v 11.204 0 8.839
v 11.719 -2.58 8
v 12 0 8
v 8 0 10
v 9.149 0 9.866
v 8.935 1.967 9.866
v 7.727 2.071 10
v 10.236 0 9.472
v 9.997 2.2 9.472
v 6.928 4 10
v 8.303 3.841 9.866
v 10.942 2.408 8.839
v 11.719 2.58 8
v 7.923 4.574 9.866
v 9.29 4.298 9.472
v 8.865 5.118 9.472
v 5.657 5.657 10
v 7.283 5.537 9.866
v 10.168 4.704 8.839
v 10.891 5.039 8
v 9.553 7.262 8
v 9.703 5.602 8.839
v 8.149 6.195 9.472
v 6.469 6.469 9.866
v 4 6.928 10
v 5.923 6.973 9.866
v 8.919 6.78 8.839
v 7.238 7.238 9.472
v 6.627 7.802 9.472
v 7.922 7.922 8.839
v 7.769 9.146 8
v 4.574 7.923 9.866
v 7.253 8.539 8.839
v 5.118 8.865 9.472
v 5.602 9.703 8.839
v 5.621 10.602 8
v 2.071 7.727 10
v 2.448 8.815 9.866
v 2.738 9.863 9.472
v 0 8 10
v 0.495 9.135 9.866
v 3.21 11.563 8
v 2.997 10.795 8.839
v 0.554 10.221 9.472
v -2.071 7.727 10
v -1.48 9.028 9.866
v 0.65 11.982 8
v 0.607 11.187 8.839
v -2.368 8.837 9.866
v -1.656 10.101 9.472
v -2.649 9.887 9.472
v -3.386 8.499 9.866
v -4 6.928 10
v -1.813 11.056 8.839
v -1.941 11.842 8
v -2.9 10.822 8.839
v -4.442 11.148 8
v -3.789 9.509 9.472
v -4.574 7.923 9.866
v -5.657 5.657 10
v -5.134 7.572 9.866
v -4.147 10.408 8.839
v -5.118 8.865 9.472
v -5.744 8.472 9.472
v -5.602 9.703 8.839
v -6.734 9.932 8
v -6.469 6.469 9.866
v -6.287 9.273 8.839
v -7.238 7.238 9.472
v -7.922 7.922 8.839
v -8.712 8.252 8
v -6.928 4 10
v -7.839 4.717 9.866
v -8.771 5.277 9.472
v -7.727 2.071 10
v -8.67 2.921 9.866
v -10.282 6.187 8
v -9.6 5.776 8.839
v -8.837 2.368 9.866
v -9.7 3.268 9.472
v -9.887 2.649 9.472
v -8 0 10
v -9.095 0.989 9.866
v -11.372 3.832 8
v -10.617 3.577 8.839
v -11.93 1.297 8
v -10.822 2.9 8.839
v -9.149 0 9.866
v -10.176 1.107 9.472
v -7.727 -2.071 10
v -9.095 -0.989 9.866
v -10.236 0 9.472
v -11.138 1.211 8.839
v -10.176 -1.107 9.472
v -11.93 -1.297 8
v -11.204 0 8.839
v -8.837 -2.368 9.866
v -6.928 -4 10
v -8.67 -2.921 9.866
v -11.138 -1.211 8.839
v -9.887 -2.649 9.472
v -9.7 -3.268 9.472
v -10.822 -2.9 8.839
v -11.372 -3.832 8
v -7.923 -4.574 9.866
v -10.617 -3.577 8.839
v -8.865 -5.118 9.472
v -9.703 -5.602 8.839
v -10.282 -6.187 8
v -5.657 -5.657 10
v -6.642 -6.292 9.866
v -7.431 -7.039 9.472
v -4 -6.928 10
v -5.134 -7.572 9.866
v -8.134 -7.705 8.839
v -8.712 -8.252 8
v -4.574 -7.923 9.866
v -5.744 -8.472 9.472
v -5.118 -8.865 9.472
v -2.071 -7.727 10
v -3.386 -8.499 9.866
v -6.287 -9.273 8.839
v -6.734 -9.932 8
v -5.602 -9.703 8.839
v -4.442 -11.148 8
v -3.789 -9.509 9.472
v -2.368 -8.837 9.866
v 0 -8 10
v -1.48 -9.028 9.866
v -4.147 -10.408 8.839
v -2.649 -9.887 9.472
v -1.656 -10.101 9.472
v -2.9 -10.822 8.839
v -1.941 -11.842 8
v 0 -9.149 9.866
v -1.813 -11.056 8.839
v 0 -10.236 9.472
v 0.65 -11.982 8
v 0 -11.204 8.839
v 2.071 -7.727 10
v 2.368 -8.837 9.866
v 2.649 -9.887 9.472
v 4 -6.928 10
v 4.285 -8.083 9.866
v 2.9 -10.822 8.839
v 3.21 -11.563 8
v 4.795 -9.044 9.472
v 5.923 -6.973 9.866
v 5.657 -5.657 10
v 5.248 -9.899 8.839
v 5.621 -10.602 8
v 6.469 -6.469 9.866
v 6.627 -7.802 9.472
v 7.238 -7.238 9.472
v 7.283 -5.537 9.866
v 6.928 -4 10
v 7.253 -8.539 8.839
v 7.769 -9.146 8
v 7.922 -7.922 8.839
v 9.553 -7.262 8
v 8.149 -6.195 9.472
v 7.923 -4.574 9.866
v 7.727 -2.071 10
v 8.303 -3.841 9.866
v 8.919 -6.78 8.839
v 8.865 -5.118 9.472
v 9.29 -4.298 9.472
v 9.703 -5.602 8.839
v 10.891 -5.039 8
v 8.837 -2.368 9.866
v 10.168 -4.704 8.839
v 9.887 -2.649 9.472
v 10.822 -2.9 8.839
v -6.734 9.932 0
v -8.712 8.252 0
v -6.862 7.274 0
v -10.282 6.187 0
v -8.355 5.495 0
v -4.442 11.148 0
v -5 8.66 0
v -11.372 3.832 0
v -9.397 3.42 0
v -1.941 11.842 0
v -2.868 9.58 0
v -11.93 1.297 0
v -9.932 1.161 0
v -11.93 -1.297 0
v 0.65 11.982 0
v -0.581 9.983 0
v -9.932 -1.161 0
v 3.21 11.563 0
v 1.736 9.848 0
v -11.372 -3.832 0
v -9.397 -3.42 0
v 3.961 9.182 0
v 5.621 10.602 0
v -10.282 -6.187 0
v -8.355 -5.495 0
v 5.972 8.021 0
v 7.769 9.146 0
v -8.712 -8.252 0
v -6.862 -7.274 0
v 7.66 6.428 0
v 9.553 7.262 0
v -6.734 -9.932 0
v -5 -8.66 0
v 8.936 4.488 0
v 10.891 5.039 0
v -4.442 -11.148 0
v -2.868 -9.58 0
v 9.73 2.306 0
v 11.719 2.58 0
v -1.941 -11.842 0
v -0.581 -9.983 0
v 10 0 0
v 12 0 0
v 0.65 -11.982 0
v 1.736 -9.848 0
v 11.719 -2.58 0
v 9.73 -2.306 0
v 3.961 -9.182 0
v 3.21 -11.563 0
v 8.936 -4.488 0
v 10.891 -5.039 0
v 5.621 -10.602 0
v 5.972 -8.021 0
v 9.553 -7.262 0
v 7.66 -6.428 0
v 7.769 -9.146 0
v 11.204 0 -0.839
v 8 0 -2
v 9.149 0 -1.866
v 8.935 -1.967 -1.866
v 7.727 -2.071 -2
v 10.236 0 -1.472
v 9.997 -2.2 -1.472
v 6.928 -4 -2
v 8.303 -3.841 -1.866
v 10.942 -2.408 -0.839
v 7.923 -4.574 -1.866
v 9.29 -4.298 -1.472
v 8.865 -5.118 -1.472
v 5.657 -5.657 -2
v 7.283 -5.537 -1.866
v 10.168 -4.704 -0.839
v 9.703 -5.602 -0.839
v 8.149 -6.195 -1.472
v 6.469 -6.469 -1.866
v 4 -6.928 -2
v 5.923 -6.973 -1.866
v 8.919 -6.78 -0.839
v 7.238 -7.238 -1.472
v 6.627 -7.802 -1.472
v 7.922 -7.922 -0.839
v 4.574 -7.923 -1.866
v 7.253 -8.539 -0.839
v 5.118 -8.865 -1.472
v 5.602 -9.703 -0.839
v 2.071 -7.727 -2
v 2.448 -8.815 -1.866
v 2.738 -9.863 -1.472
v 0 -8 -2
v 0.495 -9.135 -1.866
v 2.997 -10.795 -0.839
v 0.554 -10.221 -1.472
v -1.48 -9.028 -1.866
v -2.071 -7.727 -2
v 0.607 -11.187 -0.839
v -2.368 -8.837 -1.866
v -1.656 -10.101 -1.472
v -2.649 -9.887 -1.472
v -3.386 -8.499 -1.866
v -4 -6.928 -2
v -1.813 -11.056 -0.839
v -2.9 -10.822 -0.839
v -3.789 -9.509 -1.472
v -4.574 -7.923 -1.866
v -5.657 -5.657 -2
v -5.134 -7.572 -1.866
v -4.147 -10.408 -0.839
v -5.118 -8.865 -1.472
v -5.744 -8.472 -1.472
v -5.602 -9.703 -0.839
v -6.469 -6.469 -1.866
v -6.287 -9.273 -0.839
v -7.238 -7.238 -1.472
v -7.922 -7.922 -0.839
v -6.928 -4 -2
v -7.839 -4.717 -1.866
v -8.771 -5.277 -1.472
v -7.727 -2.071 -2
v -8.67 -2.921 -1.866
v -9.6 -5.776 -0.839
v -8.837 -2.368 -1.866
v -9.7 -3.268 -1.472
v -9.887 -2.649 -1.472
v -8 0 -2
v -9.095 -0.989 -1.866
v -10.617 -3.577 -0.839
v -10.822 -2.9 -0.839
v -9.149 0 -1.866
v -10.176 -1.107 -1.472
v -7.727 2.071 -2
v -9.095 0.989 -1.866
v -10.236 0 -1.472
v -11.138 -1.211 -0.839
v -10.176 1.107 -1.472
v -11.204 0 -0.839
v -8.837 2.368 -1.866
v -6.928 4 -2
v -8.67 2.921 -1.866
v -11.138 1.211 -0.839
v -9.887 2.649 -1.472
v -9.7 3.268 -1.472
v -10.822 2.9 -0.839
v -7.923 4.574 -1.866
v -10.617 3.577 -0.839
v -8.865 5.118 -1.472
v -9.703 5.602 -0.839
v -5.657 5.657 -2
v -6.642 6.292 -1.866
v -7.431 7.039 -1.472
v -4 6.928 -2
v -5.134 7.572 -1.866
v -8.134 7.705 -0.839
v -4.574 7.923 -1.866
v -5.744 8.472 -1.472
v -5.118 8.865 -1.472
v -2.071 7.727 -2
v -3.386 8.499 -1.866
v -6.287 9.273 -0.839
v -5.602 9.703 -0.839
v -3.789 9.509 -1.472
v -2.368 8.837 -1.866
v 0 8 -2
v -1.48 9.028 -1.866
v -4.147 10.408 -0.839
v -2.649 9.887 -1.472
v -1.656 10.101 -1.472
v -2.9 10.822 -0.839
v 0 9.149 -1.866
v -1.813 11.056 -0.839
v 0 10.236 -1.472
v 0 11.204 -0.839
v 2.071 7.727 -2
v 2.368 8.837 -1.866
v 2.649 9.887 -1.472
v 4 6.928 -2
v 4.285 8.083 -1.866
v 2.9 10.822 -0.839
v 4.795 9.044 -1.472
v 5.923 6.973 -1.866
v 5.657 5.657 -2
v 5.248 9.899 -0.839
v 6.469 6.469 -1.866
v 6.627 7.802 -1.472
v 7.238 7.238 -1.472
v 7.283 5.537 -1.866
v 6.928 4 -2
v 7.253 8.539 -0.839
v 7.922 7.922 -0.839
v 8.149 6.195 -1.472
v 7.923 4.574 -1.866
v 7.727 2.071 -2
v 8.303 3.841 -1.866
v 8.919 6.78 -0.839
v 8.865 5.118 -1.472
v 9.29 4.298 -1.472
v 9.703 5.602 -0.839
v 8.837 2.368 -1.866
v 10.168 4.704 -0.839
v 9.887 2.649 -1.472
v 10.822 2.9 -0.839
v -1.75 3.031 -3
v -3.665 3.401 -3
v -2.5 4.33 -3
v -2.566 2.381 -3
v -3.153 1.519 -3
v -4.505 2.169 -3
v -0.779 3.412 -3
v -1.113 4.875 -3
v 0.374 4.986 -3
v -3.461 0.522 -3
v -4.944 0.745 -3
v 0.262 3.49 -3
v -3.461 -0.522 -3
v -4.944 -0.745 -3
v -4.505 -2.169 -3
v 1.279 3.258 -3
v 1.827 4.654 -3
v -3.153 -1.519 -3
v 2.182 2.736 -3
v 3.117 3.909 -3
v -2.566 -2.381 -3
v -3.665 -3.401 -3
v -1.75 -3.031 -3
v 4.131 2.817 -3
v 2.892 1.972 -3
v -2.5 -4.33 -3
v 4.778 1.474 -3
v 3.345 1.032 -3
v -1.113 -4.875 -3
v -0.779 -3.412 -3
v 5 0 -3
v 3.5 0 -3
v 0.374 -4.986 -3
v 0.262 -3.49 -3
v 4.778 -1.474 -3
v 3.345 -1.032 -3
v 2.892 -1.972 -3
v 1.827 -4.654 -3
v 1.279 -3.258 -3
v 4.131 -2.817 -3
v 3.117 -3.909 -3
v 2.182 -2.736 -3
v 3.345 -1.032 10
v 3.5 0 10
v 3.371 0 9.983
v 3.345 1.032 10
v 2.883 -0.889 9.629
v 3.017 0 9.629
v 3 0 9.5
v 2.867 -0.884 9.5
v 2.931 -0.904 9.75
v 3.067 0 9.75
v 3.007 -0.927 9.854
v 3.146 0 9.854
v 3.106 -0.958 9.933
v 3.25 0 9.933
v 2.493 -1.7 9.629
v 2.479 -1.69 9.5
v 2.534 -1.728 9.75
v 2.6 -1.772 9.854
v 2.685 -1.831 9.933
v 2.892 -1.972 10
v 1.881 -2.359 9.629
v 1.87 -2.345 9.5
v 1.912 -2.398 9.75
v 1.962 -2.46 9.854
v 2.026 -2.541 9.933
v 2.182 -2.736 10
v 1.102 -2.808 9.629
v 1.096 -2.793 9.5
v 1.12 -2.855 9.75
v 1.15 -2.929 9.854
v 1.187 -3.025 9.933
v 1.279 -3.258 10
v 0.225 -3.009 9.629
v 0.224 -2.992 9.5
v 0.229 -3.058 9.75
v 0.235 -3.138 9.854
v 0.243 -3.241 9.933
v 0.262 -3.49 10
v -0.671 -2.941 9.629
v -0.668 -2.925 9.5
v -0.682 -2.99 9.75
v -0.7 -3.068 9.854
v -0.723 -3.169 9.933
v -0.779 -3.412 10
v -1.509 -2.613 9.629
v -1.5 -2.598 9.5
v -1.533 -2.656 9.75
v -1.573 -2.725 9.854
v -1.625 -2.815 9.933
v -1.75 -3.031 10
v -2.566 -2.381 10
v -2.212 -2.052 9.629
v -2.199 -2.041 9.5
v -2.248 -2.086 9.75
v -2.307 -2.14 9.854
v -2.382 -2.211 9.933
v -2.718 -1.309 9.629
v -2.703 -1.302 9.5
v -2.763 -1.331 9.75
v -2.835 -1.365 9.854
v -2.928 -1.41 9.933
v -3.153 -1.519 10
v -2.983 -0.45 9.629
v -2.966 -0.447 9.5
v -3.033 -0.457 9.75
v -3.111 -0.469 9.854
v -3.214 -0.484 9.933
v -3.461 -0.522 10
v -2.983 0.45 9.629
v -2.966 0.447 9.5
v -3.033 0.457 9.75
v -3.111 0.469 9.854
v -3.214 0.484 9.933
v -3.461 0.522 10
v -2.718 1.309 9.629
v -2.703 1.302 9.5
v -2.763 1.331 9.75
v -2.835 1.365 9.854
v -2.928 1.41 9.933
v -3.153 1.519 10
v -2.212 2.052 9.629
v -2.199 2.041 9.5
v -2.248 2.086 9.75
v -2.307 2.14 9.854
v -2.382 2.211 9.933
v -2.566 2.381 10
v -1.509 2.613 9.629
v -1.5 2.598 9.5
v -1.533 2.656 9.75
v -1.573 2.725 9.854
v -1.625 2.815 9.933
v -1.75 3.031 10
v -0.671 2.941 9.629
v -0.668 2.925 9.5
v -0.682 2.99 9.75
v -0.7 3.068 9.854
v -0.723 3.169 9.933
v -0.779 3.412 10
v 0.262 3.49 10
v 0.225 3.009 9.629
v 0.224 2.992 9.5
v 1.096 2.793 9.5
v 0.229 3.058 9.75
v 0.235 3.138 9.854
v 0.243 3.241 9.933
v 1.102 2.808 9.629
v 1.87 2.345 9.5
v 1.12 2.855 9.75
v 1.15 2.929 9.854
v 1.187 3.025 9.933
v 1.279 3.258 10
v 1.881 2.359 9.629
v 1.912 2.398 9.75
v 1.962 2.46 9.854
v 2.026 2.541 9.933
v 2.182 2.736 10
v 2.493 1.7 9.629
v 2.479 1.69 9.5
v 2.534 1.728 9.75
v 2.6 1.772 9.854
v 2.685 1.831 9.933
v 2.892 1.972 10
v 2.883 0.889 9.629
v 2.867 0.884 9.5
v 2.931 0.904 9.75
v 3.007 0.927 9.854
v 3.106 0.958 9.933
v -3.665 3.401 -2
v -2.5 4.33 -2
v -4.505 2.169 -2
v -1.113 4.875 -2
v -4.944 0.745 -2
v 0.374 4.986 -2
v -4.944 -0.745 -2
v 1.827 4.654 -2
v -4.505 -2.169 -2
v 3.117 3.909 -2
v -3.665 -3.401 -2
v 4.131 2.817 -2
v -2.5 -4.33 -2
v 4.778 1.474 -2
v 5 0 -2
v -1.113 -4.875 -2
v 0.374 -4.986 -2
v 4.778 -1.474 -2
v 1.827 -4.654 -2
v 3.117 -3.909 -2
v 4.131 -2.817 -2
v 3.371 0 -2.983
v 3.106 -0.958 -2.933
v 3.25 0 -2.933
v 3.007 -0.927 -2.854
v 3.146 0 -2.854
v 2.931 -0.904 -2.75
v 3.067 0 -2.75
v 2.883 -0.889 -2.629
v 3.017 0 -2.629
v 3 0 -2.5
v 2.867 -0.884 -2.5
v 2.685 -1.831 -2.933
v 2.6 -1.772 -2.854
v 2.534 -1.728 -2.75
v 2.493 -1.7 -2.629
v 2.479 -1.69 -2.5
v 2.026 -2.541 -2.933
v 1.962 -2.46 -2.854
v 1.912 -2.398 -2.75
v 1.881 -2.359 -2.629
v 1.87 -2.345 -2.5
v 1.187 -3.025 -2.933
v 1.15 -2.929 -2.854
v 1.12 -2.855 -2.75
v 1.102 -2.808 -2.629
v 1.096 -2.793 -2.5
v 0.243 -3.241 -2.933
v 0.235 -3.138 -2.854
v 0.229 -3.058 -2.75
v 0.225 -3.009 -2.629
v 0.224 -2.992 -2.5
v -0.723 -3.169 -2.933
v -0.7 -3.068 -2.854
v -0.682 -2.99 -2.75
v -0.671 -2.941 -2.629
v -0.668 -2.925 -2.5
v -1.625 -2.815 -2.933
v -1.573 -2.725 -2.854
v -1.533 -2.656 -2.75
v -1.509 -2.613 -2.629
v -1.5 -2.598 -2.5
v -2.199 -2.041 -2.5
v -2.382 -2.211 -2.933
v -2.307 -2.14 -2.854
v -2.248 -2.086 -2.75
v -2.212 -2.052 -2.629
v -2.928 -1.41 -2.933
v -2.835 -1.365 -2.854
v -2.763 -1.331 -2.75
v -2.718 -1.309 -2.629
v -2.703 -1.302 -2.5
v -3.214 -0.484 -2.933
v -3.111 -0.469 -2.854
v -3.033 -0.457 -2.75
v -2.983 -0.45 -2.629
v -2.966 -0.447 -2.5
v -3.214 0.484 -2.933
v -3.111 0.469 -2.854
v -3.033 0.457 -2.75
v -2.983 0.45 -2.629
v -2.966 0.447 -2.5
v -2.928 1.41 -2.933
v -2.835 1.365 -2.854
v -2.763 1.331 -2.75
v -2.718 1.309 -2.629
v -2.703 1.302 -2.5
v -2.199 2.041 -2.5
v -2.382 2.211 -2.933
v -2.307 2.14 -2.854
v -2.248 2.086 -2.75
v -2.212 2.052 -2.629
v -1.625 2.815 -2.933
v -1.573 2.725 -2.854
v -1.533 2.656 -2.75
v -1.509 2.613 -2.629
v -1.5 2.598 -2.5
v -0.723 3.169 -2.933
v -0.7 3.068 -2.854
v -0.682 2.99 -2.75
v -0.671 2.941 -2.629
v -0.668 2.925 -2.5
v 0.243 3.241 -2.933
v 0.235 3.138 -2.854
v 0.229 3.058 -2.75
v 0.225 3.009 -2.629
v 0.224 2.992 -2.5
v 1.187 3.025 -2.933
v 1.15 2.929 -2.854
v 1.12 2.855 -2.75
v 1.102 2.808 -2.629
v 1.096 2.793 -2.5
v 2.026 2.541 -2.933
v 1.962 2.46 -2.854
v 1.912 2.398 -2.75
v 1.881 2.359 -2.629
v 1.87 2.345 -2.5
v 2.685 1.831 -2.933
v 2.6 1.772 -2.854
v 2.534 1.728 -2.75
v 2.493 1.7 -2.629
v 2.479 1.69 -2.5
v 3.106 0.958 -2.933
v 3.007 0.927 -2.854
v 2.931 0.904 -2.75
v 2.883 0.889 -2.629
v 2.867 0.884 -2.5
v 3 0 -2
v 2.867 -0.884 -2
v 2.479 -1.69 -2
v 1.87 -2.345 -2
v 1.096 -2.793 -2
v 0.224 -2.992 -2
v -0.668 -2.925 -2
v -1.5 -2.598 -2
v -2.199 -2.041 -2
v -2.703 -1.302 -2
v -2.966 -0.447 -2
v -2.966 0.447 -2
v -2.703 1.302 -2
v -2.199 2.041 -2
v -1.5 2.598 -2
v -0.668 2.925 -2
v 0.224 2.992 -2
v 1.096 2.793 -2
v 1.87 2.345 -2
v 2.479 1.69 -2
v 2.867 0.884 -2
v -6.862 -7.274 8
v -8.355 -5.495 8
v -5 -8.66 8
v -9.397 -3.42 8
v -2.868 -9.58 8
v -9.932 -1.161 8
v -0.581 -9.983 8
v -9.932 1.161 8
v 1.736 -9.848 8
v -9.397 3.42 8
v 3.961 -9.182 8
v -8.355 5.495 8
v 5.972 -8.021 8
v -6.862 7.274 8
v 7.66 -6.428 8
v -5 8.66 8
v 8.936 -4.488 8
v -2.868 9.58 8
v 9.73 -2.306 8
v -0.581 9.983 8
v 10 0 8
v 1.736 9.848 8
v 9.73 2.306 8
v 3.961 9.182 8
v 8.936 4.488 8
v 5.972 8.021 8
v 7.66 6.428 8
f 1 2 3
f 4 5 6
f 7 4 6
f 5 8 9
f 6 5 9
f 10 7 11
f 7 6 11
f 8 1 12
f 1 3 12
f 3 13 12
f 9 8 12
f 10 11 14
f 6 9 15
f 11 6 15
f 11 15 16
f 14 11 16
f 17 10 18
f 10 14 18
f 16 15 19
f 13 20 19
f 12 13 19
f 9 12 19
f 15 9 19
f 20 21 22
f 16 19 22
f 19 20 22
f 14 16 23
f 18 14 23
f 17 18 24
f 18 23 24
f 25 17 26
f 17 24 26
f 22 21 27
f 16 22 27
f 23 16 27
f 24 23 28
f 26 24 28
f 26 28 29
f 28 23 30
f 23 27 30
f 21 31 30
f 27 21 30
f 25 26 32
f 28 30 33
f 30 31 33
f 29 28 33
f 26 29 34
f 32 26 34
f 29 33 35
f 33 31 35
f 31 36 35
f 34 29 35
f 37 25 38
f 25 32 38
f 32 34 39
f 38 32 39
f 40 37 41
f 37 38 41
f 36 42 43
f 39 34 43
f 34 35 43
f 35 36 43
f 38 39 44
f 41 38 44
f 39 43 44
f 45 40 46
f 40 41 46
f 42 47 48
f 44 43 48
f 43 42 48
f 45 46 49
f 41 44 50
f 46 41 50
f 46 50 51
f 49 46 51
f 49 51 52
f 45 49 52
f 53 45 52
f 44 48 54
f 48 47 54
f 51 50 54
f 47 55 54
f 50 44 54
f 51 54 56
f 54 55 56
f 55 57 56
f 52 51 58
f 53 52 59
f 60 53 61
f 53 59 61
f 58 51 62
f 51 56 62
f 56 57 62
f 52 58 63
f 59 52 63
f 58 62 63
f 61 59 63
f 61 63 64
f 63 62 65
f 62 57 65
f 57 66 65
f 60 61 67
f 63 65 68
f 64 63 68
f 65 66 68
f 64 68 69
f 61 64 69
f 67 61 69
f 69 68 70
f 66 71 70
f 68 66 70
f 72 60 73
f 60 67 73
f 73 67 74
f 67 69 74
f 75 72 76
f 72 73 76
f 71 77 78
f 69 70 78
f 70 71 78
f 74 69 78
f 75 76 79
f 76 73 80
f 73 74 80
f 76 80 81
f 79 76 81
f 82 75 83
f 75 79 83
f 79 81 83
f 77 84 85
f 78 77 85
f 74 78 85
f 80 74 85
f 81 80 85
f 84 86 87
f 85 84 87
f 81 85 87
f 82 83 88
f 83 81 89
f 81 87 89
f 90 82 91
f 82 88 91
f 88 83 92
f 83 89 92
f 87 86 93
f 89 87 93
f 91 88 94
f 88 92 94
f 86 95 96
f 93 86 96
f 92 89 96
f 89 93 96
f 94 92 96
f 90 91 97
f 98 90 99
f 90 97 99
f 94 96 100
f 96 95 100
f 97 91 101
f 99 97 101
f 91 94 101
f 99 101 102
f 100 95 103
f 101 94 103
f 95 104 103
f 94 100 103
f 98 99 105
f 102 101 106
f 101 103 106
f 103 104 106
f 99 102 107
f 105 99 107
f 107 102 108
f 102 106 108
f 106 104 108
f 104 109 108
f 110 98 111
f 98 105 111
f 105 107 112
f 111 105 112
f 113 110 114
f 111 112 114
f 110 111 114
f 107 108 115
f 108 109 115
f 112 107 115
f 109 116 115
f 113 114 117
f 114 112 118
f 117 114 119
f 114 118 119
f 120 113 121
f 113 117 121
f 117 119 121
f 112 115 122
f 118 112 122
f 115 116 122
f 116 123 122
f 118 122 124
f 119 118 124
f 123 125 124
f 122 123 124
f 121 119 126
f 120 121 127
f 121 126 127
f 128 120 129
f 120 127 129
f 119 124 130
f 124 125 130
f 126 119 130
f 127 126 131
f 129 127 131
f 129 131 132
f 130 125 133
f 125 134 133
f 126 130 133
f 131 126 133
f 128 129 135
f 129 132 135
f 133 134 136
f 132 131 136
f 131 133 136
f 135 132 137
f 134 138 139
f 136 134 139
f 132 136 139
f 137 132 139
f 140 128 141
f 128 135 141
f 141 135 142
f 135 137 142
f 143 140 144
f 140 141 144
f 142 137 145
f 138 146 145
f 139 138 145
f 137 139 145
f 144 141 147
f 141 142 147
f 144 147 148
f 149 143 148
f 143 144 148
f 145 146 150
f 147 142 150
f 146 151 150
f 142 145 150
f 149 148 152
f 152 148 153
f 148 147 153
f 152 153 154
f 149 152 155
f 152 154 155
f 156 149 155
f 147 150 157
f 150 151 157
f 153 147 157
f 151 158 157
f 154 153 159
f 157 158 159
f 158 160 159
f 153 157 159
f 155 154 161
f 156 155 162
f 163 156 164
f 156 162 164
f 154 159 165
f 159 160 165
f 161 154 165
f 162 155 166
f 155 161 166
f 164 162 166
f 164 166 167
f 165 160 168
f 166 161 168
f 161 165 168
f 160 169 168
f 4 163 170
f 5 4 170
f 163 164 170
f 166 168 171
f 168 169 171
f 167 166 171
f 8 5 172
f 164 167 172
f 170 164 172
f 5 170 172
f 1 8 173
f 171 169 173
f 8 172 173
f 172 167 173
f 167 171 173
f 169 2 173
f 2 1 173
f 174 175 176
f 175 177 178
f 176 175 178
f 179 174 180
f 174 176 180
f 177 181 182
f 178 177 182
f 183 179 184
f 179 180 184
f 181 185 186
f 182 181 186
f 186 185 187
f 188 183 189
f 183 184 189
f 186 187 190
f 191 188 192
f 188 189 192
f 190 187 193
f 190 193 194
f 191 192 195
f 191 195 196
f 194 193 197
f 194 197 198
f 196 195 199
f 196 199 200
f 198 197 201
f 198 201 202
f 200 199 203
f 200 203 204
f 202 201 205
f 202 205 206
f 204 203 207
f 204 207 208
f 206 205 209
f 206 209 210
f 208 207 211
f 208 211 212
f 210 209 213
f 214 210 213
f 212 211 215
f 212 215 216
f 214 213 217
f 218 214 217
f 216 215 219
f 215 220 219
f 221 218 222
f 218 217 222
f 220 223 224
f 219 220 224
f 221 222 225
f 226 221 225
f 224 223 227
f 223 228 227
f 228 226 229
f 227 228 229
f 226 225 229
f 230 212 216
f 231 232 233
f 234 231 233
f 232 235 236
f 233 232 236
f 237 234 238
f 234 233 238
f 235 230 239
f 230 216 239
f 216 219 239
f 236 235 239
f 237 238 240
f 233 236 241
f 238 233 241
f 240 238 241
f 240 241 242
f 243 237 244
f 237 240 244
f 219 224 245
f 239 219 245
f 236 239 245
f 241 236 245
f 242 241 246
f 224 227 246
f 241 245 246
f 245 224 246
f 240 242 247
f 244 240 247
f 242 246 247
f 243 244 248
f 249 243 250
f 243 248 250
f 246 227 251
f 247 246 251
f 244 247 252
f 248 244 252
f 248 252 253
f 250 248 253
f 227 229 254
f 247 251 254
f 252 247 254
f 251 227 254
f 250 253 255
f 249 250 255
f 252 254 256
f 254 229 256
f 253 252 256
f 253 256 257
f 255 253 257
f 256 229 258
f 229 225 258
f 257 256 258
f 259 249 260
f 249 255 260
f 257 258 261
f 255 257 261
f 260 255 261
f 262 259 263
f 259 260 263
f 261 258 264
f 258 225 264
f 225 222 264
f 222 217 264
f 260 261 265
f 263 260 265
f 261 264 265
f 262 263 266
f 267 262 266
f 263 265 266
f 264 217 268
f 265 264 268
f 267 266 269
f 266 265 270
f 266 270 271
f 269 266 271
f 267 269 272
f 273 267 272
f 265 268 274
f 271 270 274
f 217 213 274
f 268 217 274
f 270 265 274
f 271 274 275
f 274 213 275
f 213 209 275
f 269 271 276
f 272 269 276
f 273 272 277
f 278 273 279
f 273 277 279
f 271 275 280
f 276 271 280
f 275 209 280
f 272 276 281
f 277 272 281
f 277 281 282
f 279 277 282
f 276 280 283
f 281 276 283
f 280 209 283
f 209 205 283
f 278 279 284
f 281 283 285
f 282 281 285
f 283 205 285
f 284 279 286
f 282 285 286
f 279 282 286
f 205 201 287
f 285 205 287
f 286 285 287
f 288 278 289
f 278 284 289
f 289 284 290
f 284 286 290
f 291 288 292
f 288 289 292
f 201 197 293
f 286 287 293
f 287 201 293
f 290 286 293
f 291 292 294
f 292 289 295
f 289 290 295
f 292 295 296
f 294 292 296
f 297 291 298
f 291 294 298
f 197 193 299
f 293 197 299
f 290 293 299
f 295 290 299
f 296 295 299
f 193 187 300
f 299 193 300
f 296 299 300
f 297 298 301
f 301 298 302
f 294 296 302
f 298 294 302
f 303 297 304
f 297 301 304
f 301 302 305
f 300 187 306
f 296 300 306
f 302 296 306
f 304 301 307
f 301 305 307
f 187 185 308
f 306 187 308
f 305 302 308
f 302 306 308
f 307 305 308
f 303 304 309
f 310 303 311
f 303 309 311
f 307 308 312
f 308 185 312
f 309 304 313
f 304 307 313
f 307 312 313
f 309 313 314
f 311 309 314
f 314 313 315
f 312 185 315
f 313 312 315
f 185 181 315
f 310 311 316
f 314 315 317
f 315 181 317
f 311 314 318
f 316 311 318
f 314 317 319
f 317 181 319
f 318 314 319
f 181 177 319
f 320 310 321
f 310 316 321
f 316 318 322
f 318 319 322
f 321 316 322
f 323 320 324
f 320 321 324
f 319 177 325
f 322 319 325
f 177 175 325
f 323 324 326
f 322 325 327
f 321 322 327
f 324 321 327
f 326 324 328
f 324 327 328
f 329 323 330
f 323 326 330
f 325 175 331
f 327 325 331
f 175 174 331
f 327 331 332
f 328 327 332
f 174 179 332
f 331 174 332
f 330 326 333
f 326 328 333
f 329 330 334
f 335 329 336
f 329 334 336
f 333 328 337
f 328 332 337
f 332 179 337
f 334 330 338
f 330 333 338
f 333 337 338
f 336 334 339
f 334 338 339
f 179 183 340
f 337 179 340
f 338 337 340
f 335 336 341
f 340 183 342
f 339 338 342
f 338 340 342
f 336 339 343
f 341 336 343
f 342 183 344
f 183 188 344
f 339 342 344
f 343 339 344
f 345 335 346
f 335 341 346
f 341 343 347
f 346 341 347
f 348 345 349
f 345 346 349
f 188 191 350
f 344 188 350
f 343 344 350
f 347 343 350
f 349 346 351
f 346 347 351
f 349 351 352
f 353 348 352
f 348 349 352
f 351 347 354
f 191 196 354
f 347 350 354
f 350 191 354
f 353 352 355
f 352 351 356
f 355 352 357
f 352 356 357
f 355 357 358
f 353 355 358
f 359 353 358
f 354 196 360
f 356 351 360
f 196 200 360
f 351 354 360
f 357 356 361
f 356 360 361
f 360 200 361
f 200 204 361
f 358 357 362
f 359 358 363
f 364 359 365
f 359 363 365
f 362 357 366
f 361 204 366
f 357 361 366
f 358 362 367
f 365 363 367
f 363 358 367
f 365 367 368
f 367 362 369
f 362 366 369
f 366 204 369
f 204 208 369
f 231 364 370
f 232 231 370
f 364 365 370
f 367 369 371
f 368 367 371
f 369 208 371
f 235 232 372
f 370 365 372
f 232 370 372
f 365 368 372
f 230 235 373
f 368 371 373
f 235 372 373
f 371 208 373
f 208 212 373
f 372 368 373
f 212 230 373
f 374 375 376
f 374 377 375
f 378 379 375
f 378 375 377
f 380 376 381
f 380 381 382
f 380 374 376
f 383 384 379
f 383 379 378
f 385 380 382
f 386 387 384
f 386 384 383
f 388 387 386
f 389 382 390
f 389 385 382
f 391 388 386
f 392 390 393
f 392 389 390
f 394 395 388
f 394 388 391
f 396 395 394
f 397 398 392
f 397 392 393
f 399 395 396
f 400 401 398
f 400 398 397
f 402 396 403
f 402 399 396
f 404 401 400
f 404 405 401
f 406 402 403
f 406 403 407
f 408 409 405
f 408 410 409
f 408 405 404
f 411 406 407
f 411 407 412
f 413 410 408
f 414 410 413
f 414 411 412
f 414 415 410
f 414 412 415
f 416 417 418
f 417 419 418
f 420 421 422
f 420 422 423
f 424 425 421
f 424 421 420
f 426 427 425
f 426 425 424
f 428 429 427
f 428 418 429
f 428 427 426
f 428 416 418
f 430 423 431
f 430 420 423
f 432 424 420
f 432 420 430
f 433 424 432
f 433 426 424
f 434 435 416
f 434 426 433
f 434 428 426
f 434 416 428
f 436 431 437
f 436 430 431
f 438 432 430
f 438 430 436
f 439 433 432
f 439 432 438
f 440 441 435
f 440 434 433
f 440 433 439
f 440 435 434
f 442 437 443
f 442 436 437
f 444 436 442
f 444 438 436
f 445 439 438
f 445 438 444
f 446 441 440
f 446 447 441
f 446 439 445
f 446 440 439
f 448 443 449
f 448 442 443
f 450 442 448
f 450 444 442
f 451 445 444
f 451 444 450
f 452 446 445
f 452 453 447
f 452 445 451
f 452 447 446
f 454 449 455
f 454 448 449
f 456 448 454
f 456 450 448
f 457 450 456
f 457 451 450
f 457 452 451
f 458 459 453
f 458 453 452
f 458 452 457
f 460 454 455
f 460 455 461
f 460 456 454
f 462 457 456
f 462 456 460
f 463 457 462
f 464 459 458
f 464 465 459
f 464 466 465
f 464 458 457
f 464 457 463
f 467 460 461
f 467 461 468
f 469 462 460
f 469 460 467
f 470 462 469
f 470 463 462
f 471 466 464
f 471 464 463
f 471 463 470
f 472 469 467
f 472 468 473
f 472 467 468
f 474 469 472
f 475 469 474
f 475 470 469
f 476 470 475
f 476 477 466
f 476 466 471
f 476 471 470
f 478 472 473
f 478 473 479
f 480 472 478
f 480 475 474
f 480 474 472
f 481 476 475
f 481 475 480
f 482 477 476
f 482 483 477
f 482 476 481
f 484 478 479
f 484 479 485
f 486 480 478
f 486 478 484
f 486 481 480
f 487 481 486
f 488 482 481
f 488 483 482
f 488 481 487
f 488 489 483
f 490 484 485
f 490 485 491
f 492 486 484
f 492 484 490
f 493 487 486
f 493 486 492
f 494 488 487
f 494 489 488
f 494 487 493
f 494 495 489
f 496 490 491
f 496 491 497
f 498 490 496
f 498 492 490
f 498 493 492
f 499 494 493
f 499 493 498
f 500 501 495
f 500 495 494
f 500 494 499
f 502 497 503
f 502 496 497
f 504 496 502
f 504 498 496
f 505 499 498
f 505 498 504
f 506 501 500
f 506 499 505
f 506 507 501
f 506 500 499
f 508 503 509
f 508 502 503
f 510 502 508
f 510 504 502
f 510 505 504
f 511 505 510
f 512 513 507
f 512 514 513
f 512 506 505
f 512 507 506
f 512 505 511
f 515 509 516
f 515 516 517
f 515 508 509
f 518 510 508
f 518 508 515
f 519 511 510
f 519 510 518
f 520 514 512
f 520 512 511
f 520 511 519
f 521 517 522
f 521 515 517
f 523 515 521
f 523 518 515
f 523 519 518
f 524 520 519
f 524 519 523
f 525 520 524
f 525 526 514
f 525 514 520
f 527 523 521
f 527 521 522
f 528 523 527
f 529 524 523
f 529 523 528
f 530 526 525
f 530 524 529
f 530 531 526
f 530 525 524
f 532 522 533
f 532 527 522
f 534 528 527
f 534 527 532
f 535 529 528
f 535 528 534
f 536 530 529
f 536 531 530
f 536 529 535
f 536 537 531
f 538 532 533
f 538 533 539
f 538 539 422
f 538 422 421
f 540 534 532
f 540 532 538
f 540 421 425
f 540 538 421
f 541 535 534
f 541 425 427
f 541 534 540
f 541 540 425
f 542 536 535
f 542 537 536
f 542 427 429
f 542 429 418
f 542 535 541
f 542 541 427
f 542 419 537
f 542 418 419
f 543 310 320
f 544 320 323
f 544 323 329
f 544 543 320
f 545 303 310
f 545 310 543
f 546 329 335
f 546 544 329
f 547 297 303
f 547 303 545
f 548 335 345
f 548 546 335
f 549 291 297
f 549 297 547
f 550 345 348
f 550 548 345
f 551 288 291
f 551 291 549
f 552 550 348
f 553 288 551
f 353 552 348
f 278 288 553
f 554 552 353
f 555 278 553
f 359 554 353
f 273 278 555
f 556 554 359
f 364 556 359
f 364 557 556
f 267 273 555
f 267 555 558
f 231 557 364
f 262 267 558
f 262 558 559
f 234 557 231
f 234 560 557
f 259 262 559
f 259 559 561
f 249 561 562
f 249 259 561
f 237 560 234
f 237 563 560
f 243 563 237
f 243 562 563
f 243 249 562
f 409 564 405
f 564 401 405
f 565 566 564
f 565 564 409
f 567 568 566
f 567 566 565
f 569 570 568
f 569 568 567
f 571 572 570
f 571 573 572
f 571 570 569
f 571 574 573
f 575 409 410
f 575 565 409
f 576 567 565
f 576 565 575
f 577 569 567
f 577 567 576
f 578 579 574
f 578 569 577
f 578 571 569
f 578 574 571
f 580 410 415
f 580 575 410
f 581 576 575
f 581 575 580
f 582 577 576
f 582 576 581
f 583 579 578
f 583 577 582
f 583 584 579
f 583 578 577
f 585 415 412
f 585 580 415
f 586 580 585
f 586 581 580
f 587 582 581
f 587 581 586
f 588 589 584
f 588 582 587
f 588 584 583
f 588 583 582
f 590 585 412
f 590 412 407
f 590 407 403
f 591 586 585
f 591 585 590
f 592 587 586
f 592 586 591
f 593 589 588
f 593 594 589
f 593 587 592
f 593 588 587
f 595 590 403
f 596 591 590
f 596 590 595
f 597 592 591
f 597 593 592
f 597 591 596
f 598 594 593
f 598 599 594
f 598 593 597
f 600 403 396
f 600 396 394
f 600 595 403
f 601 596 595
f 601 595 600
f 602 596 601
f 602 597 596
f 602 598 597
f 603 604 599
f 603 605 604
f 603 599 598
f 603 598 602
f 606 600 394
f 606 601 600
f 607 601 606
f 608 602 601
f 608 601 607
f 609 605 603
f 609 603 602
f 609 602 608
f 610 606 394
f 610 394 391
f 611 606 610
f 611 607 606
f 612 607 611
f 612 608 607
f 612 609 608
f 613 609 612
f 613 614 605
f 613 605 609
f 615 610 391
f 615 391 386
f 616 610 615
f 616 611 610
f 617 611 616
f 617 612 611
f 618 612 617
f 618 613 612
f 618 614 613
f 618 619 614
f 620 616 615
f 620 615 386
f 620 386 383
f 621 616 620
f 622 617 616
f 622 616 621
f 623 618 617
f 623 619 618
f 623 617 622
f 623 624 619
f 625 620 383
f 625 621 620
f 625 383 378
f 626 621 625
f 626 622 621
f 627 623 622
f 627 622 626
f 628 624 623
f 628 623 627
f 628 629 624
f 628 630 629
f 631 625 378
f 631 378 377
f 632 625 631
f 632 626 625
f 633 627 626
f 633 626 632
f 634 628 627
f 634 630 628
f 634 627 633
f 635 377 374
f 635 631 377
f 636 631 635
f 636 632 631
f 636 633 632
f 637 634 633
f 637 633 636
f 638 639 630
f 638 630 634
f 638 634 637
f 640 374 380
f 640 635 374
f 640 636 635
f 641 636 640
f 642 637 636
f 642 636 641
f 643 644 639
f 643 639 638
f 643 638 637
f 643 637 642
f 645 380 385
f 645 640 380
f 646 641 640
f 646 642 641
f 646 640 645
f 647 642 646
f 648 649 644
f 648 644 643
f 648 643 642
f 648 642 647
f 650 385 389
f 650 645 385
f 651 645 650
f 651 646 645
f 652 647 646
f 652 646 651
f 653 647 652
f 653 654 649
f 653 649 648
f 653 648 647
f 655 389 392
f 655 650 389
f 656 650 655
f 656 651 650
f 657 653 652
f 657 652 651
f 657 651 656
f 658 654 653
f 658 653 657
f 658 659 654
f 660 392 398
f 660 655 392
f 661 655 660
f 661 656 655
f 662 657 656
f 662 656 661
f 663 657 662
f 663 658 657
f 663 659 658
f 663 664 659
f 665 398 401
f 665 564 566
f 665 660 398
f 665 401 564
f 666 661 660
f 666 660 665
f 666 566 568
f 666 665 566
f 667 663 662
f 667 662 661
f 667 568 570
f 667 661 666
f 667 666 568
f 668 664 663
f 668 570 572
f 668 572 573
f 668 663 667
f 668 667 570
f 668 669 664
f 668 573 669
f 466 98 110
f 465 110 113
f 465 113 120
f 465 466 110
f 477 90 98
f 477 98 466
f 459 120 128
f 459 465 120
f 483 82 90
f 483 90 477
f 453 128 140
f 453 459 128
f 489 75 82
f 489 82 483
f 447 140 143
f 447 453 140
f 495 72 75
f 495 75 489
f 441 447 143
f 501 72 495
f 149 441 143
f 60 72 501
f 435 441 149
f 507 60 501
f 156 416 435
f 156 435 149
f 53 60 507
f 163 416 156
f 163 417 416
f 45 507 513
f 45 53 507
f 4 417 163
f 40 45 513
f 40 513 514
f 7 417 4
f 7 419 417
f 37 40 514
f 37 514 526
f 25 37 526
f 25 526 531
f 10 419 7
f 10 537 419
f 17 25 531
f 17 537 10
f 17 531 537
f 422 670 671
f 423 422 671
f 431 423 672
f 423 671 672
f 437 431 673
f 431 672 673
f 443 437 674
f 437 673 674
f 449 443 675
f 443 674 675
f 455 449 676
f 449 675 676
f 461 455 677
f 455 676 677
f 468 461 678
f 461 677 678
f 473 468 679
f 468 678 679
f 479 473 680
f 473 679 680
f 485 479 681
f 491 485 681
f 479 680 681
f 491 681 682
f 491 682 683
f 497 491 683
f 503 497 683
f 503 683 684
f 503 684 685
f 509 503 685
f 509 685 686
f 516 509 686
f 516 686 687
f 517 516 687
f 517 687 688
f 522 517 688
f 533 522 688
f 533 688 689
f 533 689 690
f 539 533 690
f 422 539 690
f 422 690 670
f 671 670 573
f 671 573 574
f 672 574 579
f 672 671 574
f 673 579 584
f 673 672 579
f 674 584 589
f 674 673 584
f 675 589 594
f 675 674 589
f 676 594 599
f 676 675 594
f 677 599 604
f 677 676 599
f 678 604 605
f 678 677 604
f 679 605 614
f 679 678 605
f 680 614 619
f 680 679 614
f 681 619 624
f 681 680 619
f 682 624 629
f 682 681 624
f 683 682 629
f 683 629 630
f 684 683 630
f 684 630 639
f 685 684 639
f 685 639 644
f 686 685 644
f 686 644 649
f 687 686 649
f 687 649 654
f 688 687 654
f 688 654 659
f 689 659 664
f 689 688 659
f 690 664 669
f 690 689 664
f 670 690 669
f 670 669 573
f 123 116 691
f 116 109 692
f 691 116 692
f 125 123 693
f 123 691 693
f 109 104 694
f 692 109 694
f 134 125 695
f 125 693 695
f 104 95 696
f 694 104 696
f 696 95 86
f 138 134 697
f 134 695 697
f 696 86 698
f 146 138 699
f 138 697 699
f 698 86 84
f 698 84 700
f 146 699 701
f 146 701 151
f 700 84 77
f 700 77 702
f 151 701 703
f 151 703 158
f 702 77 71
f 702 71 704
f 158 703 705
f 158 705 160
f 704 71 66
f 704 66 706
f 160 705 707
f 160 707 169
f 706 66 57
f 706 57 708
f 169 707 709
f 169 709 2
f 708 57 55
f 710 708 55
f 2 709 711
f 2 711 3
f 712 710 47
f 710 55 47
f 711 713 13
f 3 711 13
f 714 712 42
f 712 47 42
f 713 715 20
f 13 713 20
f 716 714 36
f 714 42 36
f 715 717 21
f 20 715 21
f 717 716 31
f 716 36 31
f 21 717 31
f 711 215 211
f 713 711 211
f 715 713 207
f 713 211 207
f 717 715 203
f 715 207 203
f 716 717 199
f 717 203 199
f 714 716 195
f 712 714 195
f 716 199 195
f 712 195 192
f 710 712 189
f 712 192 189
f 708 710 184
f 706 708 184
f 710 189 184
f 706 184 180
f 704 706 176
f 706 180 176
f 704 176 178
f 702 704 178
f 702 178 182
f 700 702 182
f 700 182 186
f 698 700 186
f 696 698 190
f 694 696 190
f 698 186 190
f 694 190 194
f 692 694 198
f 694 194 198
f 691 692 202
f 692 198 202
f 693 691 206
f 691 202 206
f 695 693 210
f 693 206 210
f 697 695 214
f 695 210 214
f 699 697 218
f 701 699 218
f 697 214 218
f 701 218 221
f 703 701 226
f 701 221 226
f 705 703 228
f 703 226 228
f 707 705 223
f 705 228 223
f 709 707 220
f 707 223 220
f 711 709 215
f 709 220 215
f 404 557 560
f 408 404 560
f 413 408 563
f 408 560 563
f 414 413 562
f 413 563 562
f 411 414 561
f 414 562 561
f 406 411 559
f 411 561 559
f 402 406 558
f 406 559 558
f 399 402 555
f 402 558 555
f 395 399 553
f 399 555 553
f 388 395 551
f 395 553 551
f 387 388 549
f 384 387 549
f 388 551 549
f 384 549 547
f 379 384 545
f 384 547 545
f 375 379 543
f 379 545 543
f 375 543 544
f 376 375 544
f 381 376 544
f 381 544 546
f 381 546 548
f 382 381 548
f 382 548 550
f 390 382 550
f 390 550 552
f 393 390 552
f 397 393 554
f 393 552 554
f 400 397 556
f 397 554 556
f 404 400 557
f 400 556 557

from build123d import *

# Parameters (mm, degrees)
F0_R      = 10
F1_DEPTH  = 8
F2_R      = 12
F2_R_2    = 10
F3_DEPTH  = 2
F4_R      = 12
F4_R_2    = 10
F5_DEPTH  = 2
F6_R      = 3
F7_DEPTH  = 25
F9_R      = 5
F9_R_2    = 3
F10_DEPTH = 1
F11_R     = 0.5
F13_R     = 0.5


# Not quite as in the source:
# - a fillet or chamfer that OpenCascade refuses, or shapes differently, is made with other operations: its cross-section is extruded or revolved along the edge and cut away or added


with BuildPart() as f1:
    # F0 (on Top) → F1 (new body)
    with BuildSketch(Plane.XY):
        Circle(F0_R)
    extrude(amount=F1_DEPTH)

    # F2 (on face) → F3 (join)
    with BuildSketch(Plane.XY.offset(8)):
        Circle(F2_R)
        Circle(F2_R_2, mode=Mode.SUBTRACT)
        Circle(F2_R_2)
    extrude(amount=F3_DEPTH)

    # F4 (on face) → F5 (join)
    with BuildSketch(Plane(origin=(0, 0, 0), x_dir=(1, 0, 0), z_dir=(0, 0, -1))):
        Circle(F4_R)
        Circle(F4_R_2, mode=Mode.SUBTRACT)
        Circle(F4_R_2)
    extrude(amount=F5_DEPTH)

    # F6 (on face) → F7 (cut)
    with BuildSketch(Plane(origin=(0, 0, -2), x_dir=(1, 0, 0), z_dir=(0, 0, -1))):
        Circle(F6_R)
    extrude(amount=-F7_DEPTH, mode=Mode.SUBTRACT)

    # F8: union 

    # F9 (on face) → F10 (join)
    with BuildSketch(Plane(origin=(0, 0, -2), x_dir=(1, 0, 0), z_dir=(0, 0, -1))):
        Circle(F9_R)
        Circle(F9_R_2, mode=Mode.SUBTRACT)
    extrude(amount=F10_DEPTH)

    # F11
    f11_edges = [f1.edges().sort_by_distance(p)[0] for p in [
        (-3, 0, -3),
    ]]
    fillet(f11_edges, radius=F11_R)

    # F12: fillet of radius 5 on 2 edges, made by hand

    # F12_s1 → F12_t2 (revolve, cut)
    with BuildSketch(Plane.XZ):
        with BuildLine():
            ThreePointArc((8, -2), (10.2360679775, -1.472135955), (12, 0))
            Line((12, 0), (12, -2))
            Line((12, -2), (8, -2))
        make_face()
    revolve(axis=Axis((0, 0, -2), (0, 0, -1)), mode=Mode.SUBTRACT)

    # F12_s3 → F12_t4 (revolve, cut)
    with BuildSketch(Plane.XZ):
        with BuildLine():
            ThreePointArc((8, 10), (10.2360679775, 9.472135955), (12, 8))
            Line((12, 8), (12, 10))
            Line((12, 10), (8, 10))
        make_face()
    revolve(axis=Axis((0, 0, 10), (0, 0, 1)), mode=Mode.SUBTRACT)

    # F13
    f13_edges = [f1.edges().sort_by_distance(p)[0] for p in [
        (3, 0, 4),
        (-3, 0, 10),
        (-3, 0, -2),
        (3, 0, -2.25),
        (-3, 0, -2.5),
    ]]
    fillet(f13_edges, radius=F13_R)


solid = f1.part
